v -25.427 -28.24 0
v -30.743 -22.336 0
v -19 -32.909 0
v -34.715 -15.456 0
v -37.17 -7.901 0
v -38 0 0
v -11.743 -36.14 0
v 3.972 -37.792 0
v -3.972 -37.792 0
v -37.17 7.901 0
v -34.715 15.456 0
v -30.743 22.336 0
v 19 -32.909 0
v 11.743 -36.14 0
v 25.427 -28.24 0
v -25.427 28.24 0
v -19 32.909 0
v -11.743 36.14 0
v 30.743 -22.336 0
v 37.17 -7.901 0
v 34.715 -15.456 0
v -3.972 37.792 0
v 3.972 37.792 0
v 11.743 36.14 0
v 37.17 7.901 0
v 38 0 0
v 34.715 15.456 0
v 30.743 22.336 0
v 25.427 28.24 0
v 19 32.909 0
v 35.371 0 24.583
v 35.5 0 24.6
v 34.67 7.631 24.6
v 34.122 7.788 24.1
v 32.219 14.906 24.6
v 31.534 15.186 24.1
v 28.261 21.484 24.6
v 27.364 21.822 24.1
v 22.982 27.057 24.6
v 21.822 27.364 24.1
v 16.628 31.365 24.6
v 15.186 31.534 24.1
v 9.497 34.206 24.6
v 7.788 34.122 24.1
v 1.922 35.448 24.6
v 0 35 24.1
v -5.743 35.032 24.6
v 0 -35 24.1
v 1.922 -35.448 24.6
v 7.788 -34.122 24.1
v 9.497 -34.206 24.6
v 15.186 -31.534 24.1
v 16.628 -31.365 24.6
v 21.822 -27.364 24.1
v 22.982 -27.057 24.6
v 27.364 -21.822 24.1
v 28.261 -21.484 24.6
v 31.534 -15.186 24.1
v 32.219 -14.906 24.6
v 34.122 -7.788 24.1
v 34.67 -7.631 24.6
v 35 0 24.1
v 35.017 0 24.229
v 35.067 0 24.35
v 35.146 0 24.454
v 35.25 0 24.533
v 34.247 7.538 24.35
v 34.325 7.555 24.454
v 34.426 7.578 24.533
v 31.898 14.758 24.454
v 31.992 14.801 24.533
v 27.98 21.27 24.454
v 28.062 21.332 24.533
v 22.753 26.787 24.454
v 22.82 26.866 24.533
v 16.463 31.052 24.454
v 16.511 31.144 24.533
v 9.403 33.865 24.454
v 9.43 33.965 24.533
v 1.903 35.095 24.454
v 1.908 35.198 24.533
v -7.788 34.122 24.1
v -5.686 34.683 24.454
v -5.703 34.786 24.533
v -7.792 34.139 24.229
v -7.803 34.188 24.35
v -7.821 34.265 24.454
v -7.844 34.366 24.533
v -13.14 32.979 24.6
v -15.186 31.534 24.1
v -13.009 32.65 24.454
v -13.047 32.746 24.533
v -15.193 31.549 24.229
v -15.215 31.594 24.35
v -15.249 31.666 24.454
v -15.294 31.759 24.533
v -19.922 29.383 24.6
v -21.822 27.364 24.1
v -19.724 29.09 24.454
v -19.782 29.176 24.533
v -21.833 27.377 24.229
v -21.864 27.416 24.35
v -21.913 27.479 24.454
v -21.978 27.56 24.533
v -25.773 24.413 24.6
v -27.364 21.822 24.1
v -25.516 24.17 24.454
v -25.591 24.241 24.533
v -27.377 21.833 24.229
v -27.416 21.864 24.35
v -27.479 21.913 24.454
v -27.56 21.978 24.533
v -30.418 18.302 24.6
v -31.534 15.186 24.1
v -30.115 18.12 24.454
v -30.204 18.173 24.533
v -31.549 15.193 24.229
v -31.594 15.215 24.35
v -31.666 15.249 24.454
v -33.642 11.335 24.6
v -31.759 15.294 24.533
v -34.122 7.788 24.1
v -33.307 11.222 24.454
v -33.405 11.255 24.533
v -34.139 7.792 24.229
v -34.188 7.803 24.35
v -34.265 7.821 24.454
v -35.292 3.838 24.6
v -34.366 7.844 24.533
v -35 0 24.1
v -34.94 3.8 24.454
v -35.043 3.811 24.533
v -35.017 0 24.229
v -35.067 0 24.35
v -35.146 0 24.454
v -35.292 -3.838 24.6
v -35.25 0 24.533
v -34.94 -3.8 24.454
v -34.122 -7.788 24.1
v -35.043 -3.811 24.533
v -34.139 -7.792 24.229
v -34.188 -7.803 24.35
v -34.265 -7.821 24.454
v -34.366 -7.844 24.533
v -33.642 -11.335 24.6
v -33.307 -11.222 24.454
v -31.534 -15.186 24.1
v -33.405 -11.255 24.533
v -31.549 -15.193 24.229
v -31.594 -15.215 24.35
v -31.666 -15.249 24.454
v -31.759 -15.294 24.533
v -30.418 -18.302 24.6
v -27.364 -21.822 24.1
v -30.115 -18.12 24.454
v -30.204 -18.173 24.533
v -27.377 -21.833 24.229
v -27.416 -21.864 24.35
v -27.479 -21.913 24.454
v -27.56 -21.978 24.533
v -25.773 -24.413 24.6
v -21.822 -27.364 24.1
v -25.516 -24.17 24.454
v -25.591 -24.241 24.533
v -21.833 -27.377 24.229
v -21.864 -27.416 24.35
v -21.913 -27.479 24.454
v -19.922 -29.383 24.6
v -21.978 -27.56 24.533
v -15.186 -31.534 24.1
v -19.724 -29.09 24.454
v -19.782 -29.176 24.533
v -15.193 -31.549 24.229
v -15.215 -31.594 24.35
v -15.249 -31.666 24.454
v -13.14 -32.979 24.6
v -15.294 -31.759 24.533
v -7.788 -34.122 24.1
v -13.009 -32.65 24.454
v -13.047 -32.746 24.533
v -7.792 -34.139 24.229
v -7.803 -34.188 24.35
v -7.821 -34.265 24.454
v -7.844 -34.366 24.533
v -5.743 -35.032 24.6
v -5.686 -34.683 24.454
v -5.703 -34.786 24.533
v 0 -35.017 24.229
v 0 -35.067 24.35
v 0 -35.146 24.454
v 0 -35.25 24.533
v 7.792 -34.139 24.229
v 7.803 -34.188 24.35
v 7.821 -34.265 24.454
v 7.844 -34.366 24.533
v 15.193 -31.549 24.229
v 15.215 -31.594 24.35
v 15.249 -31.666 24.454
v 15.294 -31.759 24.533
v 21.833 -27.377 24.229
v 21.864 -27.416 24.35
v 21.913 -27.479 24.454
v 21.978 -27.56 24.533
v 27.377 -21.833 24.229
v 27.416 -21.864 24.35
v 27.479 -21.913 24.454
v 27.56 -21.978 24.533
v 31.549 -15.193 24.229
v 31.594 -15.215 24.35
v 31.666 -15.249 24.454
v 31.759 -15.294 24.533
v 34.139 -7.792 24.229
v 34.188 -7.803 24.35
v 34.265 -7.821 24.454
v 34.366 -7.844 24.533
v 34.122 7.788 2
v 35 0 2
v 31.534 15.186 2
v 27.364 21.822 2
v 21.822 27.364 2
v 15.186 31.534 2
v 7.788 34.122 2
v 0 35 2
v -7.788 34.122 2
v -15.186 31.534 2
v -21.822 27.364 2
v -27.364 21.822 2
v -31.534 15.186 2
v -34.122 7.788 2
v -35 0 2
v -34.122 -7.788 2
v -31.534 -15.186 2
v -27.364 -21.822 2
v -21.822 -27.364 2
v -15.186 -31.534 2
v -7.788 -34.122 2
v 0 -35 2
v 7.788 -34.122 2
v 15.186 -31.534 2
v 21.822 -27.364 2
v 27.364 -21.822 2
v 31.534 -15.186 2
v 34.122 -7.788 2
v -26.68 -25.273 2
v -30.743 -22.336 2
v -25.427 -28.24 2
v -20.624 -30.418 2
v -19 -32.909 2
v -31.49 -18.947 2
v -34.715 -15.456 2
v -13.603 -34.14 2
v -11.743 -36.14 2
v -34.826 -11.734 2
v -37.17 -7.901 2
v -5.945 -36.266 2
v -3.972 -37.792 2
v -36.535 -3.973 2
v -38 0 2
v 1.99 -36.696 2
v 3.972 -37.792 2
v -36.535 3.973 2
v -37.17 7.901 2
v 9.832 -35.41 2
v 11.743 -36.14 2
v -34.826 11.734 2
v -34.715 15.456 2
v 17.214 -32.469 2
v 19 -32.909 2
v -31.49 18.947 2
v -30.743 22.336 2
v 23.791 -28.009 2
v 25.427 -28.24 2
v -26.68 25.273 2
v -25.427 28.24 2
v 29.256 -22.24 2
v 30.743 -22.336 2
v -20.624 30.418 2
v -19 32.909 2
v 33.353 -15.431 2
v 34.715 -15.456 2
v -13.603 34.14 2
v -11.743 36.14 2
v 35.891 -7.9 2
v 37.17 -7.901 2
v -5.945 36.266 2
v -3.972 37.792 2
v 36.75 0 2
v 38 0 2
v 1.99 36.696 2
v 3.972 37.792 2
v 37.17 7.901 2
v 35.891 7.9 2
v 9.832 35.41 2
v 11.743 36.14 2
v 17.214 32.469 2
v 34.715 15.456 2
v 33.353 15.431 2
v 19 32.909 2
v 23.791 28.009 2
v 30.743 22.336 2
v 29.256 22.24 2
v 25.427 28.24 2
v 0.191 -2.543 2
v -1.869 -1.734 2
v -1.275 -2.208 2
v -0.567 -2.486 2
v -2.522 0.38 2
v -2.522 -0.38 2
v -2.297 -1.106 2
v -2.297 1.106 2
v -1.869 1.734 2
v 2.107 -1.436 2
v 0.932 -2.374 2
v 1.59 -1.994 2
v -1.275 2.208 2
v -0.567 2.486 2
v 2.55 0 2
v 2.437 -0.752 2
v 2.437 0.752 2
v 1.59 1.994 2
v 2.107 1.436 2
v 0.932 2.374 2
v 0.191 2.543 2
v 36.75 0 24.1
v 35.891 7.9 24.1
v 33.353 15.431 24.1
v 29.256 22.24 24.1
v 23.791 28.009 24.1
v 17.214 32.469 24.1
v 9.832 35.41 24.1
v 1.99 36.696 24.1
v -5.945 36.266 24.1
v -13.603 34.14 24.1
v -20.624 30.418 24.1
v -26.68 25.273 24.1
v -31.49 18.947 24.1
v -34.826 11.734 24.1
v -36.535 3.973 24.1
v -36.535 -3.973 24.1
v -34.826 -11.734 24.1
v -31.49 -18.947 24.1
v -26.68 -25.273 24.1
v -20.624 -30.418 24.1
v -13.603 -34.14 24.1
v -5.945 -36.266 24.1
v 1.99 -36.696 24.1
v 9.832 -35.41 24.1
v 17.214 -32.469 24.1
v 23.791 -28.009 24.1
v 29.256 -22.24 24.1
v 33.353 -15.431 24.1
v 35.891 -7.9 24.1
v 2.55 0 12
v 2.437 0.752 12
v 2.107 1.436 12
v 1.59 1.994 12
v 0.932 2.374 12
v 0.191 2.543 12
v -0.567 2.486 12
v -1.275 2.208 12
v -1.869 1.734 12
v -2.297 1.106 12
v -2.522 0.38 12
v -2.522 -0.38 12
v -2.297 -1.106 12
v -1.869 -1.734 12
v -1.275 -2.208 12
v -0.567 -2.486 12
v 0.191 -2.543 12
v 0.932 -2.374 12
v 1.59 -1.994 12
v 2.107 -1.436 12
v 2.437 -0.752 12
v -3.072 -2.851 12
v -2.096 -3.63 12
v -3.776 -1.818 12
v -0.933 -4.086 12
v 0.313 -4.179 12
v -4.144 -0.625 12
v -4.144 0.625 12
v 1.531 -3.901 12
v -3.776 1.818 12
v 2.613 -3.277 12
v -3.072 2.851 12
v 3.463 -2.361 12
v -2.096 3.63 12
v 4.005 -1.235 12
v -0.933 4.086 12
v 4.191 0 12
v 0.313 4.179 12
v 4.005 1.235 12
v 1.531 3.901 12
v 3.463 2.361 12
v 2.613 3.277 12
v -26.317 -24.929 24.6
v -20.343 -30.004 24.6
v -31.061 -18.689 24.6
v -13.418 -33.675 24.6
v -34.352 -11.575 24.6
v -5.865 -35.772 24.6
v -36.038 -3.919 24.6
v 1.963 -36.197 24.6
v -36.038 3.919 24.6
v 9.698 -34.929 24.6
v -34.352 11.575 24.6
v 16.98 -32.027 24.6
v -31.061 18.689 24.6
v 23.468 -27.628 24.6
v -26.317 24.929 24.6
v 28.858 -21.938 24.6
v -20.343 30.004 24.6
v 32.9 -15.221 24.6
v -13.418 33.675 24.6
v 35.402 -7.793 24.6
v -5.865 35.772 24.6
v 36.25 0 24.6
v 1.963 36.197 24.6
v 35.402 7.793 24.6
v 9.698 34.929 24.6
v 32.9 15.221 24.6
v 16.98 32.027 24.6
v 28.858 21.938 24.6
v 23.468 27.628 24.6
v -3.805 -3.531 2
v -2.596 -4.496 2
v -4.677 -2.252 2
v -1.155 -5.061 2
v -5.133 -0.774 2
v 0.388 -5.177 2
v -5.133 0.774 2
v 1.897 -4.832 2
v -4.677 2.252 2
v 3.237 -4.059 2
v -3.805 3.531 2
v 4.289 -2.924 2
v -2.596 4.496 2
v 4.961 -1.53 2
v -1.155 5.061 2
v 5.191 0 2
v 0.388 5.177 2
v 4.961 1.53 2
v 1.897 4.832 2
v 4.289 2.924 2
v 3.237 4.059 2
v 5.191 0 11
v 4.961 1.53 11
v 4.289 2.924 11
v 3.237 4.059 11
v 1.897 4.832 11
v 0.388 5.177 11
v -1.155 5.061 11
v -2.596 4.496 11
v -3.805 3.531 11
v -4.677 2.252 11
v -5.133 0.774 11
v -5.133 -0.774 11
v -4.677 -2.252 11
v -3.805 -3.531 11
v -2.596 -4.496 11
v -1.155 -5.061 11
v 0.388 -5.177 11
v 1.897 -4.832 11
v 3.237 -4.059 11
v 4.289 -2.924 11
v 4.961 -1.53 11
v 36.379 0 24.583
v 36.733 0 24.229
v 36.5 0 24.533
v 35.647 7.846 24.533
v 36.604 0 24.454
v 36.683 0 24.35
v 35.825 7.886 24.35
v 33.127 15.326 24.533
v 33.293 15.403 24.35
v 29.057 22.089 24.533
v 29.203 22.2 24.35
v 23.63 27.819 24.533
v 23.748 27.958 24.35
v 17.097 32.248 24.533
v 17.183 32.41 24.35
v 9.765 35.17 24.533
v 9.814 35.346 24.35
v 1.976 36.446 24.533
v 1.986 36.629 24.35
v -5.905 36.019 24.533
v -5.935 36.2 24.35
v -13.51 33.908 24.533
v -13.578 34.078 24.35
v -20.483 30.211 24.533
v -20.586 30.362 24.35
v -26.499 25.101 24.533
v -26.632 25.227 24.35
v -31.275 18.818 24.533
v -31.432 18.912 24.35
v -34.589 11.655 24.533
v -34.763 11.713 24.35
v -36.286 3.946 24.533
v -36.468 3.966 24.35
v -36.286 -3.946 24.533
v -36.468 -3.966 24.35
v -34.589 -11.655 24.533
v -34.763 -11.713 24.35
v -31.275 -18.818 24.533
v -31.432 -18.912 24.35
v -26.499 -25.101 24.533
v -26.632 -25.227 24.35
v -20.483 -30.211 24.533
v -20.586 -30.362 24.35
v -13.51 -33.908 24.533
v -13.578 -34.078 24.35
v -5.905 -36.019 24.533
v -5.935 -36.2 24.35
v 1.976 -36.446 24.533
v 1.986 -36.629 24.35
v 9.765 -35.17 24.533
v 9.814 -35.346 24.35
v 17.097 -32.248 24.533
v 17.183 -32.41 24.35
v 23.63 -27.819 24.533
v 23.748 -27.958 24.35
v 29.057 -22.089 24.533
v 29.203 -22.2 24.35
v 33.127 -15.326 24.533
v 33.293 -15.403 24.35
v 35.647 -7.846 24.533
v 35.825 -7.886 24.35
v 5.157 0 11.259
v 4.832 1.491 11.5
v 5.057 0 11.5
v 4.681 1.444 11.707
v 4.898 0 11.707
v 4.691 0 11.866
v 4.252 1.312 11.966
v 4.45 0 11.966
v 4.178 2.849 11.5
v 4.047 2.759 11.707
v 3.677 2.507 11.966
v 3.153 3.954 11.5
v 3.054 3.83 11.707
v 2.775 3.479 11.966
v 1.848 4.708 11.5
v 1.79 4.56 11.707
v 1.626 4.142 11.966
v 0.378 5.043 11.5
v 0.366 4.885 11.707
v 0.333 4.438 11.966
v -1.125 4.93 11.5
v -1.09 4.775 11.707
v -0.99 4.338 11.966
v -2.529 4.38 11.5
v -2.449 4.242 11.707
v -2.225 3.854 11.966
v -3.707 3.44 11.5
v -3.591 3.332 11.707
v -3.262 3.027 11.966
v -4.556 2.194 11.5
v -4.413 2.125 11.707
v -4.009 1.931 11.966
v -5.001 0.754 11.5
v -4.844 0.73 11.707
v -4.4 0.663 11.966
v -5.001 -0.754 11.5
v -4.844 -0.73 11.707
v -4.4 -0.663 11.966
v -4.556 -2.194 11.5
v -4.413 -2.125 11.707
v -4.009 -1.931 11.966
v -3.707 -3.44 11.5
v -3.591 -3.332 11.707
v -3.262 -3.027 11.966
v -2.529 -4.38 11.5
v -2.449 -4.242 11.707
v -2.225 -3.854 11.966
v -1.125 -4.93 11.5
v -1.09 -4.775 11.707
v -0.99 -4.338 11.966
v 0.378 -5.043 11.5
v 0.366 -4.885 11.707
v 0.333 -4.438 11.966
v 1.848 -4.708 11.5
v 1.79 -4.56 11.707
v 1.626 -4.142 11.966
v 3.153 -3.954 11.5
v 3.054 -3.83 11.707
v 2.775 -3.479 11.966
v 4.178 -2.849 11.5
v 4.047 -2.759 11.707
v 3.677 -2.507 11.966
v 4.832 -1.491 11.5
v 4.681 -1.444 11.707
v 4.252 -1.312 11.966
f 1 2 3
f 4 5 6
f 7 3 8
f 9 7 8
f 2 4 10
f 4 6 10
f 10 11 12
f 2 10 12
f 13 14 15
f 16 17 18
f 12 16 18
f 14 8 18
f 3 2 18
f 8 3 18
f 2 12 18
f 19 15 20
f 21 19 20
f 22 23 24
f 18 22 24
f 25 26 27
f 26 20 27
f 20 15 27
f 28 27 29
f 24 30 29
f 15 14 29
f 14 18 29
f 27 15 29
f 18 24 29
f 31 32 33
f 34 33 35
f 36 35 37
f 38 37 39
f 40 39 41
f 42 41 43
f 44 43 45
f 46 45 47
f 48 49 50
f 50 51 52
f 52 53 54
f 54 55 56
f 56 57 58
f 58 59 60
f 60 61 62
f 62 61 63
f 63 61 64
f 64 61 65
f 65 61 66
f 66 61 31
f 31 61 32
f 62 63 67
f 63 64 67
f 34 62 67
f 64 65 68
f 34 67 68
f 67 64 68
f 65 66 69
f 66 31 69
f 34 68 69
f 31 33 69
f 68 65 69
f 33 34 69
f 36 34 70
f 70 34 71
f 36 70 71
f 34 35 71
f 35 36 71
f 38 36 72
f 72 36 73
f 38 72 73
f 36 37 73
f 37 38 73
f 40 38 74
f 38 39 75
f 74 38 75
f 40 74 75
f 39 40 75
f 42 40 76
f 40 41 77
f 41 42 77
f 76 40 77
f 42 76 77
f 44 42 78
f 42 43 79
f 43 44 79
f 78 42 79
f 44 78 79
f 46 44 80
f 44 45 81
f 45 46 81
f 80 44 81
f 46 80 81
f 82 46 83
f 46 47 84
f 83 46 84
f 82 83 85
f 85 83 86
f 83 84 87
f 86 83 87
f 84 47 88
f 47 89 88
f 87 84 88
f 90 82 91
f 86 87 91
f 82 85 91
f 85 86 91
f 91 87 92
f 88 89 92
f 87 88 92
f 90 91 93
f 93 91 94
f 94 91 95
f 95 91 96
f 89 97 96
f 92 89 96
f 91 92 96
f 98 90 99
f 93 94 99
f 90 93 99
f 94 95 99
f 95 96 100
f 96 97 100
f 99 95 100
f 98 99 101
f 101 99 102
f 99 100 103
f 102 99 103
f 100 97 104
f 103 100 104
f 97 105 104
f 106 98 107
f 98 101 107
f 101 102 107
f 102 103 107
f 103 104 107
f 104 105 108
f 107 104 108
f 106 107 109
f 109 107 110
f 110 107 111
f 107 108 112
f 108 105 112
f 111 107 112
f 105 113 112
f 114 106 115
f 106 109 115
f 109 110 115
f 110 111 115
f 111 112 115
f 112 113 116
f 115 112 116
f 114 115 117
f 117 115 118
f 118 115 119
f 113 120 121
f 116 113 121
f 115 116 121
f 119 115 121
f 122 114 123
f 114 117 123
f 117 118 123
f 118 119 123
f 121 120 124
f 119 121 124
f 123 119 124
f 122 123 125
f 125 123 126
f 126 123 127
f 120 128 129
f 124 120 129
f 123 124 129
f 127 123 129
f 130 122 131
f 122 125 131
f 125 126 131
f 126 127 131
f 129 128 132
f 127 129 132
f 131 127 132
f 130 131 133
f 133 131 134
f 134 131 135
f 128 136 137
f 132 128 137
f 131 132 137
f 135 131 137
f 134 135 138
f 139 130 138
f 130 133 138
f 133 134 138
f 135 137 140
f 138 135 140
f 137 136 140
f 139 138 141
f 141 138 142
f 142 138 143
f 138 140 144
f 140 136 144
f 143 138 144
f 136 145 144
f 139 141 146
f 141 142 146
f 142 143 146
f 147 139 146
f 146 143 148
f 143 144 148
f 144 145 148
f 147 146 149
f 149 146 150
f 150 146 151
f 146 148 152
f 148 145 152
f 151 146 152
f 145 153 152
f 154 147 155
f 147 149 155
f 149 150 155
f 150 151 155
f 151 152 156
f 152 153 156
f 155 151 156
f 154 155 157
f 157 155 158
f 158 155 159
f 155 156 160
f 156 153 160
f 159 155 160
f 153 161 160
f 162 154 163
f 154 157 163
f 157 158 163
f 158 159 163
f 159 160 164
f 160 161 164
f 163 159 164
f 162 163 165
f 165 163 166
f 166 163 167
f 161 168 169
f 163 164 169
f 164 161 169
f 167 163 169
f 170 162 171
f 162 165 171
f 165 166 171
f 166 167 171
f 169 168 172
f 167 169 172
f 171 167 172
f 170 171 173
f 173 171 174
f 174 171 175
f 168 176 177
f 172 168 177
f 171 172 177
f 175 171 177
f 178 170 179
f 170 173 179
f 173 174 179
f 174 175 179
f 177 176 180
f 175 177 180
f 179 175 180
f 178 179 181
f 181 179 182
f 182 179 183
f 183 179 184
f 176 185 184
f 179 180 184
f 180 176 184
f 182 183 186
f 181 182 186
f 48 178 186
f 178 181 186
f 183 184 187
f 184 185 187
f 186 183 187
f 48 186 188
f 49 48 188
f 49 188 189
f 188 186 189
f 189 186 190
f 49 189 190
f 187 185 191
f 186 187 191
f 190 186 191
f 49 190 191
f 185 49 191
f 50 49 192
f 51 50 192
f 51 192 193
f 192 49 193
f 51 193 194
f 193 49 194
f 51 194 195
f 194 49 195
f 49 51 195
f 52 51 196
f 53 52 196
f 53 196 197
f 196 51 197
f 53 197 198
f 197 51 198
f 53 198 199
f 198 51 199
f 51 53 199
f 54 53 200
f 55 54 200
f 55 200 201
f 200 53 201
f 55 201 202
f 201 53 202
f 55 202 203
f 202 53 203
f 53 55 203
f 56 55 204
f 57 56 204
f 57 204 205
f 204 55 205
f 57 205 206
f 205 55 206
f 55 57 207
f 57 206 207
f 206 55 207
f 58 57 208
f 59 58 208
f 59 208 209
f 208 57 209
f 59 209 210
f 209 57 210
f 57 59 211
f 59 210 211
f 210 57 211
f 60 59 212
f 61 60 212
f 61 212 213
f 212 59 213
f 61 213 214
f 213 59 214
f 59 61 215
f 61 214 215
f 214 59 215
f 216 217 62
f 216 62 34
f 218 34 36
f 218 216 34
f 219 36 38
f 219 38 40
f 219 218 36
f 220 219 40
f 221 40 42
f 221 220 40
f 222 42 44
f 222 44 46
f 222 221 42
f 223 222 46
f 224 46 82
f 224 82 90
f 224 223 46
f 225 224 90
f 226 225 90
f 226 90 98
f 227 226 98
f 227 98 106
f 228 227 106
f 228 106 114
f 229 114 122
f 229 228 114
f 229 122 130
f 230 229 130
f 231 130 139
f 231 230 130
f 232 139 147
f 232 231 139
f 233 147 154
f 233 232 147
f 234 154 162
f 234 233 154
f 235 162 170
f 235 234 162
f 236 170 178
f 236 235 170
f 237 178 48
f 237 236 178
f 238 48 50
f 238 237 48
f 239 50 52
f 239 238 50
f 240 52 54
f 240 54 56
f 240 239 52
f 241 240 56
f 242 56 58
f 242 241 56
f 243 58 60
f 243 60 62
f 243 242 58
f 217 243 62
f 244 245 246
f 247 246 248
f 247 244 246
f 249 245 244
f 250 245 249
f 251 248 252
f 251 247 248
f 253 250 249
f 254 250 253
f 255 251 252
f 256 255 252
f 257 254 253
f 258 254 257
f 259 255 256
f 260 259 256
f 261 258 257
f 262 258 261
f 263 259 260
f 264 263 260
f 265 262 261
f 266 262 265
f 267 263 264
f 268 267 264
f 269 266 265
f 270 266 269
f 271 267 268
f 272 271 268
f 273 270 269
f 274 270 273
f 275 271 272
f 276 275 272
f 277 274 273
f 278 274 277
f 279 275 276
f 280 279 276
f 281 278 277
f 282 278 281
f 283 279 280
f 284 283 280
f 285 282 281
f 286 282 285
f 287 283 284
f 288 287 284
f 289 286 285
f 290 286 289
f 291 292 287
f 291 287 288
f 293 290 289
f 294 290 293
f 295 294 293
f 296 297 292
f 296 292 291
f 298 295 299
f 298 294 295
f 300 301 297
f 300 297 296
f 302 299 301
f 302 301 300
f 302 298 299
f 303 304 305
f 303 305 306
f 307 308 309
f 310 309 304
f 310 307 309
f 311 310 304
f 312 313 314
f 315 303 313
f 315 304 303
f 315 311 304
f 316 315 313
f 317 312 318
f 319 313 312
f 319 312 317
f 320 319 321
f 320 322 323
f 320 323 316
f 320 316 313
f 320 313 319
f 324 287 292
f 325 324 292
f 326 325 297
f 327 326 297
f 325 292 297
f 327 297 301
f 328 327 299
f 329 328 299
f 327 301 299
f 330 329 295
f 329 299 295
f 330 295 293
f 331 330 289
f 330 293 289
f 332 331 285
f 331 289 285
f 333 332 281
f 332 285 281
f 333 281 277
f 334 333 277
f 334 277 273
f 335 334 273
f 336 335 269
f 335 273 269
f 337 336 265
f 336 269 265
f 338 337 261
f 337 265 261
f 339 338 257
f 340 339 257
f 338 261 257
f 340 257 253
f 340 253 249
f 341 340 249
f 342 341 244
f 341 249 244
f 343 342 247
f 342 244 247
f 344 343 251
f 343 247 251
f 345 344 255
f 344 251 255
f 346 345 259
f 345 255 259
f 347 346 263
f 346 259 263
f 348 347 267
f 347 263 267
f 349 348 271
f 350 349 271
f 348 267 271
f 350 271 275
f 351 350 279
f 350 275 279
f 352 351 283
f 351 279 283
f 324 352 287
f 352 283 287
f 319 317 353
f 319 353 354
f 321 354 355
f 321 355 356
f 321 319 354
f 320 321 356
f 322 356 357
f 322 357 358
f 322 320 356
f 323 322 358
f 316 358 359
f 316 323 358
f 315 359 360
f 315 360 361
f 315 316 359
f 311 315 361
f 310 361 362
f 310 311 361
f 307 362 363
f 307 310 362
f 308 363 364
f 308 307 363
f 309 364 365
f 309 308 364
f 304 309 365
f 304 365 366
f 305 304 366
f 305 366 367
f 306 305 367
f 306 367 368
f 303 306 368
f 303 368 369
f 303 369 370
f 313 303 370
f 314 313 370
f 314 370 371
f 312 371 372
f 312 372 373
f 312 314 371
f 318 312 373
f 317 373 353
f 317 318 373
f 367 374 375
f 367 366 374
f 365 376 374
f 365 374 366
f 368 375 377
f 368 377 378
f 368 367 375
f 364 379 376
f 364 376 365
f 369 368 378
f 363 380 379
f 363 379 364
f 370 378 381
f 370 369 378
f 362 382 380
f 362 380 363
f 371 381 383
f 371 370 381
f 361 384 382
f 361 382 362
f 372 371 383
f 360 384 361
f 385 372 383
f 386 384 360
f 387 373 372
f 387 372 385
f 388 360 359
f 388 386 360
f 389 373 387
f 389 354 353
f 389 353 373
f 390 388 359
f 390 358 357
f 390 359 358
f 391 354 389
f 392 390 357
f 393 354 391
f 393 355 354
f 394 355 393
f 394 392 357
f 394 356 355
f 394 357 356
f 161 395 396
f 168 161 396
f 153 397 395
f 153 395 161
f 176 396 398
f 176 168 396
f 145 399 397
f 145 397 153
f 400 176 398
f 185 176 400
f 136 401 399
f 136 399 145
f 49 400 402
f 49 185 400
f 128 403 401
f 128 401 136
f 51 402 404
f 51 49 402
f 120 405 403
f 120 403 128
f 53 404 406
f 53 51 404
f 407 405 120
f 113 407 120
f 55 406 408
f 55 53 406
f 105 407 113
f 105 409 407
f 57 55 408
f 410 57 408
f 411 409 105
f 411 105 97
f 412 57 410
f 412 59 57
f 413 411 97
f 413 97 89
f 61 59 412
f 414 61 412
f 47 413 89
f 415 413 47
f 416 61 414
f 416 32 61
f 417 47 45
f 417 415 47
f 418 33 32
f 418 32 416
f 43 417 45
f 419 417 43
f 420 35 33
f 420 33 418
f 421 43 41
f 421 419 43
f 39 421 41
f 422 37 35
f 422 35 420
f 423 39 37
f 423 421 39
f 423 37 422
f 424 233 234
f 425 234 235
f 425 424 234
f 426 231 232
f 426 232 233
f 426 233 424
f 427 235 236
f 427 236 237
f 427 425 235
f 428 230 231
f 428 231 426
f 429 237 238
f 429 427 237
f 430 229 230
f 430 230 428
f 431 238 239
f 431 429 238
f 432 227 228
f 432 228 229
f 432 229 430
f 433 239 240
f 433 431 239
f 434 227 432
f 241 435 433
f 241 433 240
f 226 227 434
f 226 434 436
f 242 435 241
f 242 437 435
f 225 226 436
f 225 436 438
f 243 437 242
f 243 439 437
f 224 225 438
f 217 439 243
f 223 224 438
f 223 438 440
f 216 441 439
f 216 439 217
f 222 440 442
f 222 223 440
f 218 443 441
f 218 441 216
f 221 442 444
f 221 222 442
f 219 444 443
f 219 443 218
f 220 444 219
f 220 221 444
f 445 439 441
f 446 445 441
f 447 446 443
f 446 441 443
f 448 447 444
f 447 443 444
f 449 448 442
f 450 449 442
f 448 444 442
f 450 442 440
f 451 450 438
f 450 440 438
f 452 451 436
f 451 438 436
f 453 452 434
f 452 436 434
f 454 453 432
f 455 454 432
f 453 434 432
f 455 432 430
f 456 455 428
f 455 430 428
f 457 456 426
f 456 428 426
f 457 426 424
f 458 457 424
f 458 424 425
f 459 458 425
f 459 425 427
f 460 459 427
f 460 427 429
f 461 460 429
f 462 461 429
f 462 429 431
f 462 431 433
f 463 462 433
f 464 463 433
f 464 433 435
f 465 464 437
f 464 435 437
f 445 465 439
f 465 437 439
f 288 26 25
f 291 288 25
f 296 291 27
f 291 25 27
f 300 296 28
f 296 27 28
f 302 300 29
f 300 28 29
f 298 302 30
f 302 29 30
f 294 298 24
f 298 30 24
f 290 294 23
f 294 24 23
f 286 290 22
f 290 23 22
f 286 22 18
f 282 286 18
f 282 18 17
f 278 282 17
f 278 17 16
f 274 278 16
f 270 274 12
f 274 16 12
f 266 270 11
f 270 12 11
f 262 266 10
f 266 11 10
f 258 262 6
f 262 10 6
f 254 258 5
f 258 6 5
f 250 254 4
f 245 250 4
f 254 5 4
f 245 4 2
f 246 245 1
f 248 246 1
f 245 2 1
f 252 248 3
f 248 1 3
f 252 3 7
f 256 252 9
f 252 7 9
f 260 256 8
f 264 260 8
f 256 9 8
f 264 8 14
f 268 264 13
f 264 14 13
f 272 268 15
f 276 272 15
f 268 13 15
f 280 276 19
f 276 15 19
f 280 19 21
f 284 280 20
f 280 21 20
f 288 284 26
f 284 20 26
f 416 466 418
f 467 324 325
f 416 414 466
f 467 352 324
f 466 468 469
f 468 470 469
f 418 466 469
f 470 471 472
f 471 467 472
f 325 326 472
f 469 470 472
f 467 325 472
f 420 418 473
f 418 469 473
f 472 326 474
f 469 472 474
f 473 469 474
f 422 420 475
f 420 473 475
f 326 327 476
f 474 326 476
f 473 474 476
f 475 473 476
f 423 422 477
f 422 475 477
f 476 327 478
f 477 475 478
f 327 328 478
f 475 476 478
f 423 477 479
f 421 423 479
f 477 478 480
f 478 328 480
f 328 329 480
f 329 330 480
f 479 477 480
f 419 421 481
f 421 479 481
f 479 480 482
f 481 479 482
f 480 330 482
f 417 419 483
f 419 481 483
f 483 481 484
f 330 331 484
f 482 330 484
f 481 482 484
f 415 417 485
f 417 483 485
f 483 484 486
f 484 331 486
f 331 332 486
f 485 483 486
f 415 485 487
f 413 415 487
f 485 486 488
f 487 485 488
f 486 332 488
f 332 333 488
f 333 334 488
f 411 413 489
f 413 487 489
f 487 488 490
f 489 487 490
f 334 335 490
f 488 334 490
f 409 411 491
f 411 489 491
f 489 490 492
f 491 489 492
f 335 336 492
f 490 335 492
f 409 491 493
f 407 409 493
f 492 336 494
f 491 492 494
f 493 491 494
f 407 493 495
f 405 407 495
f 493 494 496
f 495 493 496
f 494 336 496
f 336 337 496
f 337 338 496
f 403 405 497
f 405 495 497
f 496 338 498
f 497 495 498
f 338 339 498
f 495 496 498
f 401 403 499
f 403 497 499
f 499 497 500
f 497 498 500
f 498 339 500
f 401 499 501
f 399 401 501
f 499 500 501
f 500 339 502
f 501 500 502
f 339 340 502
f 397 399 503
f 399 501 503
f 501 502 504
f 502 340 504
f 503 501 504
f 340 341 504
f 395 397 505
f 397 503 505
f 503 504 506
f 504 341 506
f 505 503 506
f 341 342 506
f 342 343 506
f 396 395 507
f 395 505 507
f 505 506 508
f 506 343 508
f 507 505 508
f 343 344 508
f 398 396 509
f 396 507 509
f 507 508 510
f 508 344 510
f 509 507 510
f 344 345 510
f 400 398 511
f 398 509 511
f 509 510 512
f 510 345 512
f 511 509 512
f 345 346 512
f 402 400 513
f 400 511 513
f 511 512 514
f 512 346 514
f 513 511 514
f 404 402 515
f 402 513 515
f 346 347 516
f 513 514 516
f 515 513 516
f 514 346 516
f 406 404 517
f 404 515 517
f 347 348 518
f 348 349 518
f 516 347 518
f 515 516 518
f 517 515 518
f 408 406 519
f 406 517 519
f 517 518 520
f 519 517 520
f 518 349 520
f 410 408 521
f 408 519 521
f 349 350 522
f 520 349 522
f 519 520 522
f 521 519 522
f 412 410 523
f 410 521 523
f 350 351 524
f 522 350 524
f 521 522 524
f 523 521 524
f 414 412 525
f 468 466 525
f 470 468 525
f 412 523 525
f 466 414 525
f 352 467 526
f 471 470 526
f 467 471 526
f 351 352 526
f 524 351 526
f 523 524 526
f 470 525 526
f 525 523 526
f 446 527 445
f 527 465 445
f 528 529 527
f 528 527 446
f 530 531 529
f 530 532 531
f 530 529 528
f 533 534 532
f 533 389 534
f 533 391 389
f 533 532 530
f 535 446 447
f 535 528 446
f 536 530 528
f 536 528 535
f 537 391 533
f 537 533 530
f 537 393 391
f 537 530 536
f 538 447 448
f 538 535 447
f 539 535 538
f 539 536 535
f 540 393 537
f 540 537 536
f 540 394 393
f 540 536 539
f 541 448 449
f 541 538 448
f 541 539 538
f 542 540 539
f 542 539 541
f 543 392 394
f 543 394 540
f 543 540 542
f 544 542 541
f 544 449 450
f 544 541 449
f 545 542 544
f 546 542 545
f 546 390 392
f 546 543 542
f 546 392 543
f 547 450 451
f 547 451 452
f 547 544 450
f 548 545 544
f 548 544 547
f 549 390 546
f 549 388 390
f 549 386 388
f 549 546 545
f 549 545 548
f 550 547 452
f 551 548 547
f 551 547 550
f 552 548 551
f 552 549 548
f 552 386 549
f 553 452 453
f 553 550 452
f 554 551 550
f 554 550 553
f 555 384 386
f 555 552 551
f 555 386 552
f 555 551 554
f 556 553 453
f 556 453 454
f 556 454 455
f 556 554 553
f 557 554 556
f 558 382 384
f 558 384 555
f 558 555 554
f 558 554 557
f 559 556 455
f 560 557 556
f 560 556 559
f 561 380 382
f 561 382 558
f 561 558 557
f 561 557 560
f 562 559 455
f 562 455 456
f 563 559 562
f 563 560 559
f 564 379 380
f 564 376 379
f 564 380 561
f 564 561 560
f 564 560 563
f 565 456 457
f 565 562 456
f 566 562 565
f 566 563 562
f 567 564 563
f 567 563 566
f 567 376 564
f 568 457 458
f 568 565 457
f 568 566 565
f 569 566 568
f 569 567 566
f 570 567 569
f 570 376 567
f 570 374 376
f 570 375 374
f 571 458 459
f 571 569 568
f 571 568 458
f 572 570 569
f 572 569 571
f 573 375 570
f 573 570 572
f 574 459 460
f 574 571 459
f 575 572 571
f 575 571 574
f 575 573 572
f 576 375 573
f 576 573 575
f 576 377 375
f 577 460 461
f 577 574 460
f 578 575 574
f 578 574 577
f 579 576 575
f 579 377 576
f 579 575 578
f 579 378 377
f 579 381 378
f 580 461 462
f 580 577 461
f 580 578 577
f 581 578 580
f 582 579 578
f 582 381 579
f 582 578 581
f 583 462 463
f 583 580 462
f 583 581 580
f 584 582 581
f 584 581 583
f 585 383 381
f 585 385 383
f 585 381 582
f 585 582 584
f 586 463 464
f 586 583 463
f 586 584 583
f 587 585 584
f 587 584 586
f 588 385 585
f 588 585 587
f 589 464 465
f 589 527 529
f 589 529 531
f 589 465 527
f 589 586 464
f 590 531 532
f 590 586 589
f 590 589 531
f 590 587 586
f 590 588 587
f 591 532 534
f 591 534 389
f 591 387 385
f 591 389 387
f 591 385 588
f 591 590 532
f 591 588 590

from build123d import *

# Parameters (mm, degrees)
SKETCH_R      = 38
PAD_DEPTH     = 2
SKETCH001_R   = 36.75
SKETCH001_R_2 = 35
PAD001_DEPTH  = 22.6
SKETCH002_R   = 5.191137
SKETCH002_R_2 = 2.55
PAD002_DEPTH  = 10
FILLET_R      = 1
FILLET001_R   = 0.5


with BuildPart() as part:
    # Sketch → Pad (new body)
    with BuildSketch(Plane.XY):
        Circle(SKETCH_R)
    extrude(amount=PAD_DEPTH)

    # Sketch001 → Pad001 (new body)
    with BuildSketch(Plane.XY.offset(2)):
        Circle(SKETCH001_R)
        Circle(SKETCH001_R_2, mode=Mode.SUBTRACT)
    extrude(amount=PAD001_DEPTH)

    # Sketch002 → Pad002 (new body)
    with BuildSketch(Plane.XY.offset(2)):
        Circle(SKETCH002_R)
        Circle(SKETCH002_R_2, mode=Mode.SUBTRACT)
    extrude(amount=PAD002_DEPTH)

    # Fillet
    fillet_edges = [part.edges().sort_by_distance(p)[0] for p in [
        (5.191137, 0, 7),
        (-5.191137, 0, 12),
    ]]
    fillet(fillet_edges, radius=FILLET_R)

    # Fillet001
    fillet001_edges = [part.edges().sort_by_distance(p)[0] for p in [
        (-36.75, 0, 24.6),
        (-35, 0, 24.6),
    ]]
    fillet(fillet001_edges, radius=FILLET001_R)


solid = part.part
